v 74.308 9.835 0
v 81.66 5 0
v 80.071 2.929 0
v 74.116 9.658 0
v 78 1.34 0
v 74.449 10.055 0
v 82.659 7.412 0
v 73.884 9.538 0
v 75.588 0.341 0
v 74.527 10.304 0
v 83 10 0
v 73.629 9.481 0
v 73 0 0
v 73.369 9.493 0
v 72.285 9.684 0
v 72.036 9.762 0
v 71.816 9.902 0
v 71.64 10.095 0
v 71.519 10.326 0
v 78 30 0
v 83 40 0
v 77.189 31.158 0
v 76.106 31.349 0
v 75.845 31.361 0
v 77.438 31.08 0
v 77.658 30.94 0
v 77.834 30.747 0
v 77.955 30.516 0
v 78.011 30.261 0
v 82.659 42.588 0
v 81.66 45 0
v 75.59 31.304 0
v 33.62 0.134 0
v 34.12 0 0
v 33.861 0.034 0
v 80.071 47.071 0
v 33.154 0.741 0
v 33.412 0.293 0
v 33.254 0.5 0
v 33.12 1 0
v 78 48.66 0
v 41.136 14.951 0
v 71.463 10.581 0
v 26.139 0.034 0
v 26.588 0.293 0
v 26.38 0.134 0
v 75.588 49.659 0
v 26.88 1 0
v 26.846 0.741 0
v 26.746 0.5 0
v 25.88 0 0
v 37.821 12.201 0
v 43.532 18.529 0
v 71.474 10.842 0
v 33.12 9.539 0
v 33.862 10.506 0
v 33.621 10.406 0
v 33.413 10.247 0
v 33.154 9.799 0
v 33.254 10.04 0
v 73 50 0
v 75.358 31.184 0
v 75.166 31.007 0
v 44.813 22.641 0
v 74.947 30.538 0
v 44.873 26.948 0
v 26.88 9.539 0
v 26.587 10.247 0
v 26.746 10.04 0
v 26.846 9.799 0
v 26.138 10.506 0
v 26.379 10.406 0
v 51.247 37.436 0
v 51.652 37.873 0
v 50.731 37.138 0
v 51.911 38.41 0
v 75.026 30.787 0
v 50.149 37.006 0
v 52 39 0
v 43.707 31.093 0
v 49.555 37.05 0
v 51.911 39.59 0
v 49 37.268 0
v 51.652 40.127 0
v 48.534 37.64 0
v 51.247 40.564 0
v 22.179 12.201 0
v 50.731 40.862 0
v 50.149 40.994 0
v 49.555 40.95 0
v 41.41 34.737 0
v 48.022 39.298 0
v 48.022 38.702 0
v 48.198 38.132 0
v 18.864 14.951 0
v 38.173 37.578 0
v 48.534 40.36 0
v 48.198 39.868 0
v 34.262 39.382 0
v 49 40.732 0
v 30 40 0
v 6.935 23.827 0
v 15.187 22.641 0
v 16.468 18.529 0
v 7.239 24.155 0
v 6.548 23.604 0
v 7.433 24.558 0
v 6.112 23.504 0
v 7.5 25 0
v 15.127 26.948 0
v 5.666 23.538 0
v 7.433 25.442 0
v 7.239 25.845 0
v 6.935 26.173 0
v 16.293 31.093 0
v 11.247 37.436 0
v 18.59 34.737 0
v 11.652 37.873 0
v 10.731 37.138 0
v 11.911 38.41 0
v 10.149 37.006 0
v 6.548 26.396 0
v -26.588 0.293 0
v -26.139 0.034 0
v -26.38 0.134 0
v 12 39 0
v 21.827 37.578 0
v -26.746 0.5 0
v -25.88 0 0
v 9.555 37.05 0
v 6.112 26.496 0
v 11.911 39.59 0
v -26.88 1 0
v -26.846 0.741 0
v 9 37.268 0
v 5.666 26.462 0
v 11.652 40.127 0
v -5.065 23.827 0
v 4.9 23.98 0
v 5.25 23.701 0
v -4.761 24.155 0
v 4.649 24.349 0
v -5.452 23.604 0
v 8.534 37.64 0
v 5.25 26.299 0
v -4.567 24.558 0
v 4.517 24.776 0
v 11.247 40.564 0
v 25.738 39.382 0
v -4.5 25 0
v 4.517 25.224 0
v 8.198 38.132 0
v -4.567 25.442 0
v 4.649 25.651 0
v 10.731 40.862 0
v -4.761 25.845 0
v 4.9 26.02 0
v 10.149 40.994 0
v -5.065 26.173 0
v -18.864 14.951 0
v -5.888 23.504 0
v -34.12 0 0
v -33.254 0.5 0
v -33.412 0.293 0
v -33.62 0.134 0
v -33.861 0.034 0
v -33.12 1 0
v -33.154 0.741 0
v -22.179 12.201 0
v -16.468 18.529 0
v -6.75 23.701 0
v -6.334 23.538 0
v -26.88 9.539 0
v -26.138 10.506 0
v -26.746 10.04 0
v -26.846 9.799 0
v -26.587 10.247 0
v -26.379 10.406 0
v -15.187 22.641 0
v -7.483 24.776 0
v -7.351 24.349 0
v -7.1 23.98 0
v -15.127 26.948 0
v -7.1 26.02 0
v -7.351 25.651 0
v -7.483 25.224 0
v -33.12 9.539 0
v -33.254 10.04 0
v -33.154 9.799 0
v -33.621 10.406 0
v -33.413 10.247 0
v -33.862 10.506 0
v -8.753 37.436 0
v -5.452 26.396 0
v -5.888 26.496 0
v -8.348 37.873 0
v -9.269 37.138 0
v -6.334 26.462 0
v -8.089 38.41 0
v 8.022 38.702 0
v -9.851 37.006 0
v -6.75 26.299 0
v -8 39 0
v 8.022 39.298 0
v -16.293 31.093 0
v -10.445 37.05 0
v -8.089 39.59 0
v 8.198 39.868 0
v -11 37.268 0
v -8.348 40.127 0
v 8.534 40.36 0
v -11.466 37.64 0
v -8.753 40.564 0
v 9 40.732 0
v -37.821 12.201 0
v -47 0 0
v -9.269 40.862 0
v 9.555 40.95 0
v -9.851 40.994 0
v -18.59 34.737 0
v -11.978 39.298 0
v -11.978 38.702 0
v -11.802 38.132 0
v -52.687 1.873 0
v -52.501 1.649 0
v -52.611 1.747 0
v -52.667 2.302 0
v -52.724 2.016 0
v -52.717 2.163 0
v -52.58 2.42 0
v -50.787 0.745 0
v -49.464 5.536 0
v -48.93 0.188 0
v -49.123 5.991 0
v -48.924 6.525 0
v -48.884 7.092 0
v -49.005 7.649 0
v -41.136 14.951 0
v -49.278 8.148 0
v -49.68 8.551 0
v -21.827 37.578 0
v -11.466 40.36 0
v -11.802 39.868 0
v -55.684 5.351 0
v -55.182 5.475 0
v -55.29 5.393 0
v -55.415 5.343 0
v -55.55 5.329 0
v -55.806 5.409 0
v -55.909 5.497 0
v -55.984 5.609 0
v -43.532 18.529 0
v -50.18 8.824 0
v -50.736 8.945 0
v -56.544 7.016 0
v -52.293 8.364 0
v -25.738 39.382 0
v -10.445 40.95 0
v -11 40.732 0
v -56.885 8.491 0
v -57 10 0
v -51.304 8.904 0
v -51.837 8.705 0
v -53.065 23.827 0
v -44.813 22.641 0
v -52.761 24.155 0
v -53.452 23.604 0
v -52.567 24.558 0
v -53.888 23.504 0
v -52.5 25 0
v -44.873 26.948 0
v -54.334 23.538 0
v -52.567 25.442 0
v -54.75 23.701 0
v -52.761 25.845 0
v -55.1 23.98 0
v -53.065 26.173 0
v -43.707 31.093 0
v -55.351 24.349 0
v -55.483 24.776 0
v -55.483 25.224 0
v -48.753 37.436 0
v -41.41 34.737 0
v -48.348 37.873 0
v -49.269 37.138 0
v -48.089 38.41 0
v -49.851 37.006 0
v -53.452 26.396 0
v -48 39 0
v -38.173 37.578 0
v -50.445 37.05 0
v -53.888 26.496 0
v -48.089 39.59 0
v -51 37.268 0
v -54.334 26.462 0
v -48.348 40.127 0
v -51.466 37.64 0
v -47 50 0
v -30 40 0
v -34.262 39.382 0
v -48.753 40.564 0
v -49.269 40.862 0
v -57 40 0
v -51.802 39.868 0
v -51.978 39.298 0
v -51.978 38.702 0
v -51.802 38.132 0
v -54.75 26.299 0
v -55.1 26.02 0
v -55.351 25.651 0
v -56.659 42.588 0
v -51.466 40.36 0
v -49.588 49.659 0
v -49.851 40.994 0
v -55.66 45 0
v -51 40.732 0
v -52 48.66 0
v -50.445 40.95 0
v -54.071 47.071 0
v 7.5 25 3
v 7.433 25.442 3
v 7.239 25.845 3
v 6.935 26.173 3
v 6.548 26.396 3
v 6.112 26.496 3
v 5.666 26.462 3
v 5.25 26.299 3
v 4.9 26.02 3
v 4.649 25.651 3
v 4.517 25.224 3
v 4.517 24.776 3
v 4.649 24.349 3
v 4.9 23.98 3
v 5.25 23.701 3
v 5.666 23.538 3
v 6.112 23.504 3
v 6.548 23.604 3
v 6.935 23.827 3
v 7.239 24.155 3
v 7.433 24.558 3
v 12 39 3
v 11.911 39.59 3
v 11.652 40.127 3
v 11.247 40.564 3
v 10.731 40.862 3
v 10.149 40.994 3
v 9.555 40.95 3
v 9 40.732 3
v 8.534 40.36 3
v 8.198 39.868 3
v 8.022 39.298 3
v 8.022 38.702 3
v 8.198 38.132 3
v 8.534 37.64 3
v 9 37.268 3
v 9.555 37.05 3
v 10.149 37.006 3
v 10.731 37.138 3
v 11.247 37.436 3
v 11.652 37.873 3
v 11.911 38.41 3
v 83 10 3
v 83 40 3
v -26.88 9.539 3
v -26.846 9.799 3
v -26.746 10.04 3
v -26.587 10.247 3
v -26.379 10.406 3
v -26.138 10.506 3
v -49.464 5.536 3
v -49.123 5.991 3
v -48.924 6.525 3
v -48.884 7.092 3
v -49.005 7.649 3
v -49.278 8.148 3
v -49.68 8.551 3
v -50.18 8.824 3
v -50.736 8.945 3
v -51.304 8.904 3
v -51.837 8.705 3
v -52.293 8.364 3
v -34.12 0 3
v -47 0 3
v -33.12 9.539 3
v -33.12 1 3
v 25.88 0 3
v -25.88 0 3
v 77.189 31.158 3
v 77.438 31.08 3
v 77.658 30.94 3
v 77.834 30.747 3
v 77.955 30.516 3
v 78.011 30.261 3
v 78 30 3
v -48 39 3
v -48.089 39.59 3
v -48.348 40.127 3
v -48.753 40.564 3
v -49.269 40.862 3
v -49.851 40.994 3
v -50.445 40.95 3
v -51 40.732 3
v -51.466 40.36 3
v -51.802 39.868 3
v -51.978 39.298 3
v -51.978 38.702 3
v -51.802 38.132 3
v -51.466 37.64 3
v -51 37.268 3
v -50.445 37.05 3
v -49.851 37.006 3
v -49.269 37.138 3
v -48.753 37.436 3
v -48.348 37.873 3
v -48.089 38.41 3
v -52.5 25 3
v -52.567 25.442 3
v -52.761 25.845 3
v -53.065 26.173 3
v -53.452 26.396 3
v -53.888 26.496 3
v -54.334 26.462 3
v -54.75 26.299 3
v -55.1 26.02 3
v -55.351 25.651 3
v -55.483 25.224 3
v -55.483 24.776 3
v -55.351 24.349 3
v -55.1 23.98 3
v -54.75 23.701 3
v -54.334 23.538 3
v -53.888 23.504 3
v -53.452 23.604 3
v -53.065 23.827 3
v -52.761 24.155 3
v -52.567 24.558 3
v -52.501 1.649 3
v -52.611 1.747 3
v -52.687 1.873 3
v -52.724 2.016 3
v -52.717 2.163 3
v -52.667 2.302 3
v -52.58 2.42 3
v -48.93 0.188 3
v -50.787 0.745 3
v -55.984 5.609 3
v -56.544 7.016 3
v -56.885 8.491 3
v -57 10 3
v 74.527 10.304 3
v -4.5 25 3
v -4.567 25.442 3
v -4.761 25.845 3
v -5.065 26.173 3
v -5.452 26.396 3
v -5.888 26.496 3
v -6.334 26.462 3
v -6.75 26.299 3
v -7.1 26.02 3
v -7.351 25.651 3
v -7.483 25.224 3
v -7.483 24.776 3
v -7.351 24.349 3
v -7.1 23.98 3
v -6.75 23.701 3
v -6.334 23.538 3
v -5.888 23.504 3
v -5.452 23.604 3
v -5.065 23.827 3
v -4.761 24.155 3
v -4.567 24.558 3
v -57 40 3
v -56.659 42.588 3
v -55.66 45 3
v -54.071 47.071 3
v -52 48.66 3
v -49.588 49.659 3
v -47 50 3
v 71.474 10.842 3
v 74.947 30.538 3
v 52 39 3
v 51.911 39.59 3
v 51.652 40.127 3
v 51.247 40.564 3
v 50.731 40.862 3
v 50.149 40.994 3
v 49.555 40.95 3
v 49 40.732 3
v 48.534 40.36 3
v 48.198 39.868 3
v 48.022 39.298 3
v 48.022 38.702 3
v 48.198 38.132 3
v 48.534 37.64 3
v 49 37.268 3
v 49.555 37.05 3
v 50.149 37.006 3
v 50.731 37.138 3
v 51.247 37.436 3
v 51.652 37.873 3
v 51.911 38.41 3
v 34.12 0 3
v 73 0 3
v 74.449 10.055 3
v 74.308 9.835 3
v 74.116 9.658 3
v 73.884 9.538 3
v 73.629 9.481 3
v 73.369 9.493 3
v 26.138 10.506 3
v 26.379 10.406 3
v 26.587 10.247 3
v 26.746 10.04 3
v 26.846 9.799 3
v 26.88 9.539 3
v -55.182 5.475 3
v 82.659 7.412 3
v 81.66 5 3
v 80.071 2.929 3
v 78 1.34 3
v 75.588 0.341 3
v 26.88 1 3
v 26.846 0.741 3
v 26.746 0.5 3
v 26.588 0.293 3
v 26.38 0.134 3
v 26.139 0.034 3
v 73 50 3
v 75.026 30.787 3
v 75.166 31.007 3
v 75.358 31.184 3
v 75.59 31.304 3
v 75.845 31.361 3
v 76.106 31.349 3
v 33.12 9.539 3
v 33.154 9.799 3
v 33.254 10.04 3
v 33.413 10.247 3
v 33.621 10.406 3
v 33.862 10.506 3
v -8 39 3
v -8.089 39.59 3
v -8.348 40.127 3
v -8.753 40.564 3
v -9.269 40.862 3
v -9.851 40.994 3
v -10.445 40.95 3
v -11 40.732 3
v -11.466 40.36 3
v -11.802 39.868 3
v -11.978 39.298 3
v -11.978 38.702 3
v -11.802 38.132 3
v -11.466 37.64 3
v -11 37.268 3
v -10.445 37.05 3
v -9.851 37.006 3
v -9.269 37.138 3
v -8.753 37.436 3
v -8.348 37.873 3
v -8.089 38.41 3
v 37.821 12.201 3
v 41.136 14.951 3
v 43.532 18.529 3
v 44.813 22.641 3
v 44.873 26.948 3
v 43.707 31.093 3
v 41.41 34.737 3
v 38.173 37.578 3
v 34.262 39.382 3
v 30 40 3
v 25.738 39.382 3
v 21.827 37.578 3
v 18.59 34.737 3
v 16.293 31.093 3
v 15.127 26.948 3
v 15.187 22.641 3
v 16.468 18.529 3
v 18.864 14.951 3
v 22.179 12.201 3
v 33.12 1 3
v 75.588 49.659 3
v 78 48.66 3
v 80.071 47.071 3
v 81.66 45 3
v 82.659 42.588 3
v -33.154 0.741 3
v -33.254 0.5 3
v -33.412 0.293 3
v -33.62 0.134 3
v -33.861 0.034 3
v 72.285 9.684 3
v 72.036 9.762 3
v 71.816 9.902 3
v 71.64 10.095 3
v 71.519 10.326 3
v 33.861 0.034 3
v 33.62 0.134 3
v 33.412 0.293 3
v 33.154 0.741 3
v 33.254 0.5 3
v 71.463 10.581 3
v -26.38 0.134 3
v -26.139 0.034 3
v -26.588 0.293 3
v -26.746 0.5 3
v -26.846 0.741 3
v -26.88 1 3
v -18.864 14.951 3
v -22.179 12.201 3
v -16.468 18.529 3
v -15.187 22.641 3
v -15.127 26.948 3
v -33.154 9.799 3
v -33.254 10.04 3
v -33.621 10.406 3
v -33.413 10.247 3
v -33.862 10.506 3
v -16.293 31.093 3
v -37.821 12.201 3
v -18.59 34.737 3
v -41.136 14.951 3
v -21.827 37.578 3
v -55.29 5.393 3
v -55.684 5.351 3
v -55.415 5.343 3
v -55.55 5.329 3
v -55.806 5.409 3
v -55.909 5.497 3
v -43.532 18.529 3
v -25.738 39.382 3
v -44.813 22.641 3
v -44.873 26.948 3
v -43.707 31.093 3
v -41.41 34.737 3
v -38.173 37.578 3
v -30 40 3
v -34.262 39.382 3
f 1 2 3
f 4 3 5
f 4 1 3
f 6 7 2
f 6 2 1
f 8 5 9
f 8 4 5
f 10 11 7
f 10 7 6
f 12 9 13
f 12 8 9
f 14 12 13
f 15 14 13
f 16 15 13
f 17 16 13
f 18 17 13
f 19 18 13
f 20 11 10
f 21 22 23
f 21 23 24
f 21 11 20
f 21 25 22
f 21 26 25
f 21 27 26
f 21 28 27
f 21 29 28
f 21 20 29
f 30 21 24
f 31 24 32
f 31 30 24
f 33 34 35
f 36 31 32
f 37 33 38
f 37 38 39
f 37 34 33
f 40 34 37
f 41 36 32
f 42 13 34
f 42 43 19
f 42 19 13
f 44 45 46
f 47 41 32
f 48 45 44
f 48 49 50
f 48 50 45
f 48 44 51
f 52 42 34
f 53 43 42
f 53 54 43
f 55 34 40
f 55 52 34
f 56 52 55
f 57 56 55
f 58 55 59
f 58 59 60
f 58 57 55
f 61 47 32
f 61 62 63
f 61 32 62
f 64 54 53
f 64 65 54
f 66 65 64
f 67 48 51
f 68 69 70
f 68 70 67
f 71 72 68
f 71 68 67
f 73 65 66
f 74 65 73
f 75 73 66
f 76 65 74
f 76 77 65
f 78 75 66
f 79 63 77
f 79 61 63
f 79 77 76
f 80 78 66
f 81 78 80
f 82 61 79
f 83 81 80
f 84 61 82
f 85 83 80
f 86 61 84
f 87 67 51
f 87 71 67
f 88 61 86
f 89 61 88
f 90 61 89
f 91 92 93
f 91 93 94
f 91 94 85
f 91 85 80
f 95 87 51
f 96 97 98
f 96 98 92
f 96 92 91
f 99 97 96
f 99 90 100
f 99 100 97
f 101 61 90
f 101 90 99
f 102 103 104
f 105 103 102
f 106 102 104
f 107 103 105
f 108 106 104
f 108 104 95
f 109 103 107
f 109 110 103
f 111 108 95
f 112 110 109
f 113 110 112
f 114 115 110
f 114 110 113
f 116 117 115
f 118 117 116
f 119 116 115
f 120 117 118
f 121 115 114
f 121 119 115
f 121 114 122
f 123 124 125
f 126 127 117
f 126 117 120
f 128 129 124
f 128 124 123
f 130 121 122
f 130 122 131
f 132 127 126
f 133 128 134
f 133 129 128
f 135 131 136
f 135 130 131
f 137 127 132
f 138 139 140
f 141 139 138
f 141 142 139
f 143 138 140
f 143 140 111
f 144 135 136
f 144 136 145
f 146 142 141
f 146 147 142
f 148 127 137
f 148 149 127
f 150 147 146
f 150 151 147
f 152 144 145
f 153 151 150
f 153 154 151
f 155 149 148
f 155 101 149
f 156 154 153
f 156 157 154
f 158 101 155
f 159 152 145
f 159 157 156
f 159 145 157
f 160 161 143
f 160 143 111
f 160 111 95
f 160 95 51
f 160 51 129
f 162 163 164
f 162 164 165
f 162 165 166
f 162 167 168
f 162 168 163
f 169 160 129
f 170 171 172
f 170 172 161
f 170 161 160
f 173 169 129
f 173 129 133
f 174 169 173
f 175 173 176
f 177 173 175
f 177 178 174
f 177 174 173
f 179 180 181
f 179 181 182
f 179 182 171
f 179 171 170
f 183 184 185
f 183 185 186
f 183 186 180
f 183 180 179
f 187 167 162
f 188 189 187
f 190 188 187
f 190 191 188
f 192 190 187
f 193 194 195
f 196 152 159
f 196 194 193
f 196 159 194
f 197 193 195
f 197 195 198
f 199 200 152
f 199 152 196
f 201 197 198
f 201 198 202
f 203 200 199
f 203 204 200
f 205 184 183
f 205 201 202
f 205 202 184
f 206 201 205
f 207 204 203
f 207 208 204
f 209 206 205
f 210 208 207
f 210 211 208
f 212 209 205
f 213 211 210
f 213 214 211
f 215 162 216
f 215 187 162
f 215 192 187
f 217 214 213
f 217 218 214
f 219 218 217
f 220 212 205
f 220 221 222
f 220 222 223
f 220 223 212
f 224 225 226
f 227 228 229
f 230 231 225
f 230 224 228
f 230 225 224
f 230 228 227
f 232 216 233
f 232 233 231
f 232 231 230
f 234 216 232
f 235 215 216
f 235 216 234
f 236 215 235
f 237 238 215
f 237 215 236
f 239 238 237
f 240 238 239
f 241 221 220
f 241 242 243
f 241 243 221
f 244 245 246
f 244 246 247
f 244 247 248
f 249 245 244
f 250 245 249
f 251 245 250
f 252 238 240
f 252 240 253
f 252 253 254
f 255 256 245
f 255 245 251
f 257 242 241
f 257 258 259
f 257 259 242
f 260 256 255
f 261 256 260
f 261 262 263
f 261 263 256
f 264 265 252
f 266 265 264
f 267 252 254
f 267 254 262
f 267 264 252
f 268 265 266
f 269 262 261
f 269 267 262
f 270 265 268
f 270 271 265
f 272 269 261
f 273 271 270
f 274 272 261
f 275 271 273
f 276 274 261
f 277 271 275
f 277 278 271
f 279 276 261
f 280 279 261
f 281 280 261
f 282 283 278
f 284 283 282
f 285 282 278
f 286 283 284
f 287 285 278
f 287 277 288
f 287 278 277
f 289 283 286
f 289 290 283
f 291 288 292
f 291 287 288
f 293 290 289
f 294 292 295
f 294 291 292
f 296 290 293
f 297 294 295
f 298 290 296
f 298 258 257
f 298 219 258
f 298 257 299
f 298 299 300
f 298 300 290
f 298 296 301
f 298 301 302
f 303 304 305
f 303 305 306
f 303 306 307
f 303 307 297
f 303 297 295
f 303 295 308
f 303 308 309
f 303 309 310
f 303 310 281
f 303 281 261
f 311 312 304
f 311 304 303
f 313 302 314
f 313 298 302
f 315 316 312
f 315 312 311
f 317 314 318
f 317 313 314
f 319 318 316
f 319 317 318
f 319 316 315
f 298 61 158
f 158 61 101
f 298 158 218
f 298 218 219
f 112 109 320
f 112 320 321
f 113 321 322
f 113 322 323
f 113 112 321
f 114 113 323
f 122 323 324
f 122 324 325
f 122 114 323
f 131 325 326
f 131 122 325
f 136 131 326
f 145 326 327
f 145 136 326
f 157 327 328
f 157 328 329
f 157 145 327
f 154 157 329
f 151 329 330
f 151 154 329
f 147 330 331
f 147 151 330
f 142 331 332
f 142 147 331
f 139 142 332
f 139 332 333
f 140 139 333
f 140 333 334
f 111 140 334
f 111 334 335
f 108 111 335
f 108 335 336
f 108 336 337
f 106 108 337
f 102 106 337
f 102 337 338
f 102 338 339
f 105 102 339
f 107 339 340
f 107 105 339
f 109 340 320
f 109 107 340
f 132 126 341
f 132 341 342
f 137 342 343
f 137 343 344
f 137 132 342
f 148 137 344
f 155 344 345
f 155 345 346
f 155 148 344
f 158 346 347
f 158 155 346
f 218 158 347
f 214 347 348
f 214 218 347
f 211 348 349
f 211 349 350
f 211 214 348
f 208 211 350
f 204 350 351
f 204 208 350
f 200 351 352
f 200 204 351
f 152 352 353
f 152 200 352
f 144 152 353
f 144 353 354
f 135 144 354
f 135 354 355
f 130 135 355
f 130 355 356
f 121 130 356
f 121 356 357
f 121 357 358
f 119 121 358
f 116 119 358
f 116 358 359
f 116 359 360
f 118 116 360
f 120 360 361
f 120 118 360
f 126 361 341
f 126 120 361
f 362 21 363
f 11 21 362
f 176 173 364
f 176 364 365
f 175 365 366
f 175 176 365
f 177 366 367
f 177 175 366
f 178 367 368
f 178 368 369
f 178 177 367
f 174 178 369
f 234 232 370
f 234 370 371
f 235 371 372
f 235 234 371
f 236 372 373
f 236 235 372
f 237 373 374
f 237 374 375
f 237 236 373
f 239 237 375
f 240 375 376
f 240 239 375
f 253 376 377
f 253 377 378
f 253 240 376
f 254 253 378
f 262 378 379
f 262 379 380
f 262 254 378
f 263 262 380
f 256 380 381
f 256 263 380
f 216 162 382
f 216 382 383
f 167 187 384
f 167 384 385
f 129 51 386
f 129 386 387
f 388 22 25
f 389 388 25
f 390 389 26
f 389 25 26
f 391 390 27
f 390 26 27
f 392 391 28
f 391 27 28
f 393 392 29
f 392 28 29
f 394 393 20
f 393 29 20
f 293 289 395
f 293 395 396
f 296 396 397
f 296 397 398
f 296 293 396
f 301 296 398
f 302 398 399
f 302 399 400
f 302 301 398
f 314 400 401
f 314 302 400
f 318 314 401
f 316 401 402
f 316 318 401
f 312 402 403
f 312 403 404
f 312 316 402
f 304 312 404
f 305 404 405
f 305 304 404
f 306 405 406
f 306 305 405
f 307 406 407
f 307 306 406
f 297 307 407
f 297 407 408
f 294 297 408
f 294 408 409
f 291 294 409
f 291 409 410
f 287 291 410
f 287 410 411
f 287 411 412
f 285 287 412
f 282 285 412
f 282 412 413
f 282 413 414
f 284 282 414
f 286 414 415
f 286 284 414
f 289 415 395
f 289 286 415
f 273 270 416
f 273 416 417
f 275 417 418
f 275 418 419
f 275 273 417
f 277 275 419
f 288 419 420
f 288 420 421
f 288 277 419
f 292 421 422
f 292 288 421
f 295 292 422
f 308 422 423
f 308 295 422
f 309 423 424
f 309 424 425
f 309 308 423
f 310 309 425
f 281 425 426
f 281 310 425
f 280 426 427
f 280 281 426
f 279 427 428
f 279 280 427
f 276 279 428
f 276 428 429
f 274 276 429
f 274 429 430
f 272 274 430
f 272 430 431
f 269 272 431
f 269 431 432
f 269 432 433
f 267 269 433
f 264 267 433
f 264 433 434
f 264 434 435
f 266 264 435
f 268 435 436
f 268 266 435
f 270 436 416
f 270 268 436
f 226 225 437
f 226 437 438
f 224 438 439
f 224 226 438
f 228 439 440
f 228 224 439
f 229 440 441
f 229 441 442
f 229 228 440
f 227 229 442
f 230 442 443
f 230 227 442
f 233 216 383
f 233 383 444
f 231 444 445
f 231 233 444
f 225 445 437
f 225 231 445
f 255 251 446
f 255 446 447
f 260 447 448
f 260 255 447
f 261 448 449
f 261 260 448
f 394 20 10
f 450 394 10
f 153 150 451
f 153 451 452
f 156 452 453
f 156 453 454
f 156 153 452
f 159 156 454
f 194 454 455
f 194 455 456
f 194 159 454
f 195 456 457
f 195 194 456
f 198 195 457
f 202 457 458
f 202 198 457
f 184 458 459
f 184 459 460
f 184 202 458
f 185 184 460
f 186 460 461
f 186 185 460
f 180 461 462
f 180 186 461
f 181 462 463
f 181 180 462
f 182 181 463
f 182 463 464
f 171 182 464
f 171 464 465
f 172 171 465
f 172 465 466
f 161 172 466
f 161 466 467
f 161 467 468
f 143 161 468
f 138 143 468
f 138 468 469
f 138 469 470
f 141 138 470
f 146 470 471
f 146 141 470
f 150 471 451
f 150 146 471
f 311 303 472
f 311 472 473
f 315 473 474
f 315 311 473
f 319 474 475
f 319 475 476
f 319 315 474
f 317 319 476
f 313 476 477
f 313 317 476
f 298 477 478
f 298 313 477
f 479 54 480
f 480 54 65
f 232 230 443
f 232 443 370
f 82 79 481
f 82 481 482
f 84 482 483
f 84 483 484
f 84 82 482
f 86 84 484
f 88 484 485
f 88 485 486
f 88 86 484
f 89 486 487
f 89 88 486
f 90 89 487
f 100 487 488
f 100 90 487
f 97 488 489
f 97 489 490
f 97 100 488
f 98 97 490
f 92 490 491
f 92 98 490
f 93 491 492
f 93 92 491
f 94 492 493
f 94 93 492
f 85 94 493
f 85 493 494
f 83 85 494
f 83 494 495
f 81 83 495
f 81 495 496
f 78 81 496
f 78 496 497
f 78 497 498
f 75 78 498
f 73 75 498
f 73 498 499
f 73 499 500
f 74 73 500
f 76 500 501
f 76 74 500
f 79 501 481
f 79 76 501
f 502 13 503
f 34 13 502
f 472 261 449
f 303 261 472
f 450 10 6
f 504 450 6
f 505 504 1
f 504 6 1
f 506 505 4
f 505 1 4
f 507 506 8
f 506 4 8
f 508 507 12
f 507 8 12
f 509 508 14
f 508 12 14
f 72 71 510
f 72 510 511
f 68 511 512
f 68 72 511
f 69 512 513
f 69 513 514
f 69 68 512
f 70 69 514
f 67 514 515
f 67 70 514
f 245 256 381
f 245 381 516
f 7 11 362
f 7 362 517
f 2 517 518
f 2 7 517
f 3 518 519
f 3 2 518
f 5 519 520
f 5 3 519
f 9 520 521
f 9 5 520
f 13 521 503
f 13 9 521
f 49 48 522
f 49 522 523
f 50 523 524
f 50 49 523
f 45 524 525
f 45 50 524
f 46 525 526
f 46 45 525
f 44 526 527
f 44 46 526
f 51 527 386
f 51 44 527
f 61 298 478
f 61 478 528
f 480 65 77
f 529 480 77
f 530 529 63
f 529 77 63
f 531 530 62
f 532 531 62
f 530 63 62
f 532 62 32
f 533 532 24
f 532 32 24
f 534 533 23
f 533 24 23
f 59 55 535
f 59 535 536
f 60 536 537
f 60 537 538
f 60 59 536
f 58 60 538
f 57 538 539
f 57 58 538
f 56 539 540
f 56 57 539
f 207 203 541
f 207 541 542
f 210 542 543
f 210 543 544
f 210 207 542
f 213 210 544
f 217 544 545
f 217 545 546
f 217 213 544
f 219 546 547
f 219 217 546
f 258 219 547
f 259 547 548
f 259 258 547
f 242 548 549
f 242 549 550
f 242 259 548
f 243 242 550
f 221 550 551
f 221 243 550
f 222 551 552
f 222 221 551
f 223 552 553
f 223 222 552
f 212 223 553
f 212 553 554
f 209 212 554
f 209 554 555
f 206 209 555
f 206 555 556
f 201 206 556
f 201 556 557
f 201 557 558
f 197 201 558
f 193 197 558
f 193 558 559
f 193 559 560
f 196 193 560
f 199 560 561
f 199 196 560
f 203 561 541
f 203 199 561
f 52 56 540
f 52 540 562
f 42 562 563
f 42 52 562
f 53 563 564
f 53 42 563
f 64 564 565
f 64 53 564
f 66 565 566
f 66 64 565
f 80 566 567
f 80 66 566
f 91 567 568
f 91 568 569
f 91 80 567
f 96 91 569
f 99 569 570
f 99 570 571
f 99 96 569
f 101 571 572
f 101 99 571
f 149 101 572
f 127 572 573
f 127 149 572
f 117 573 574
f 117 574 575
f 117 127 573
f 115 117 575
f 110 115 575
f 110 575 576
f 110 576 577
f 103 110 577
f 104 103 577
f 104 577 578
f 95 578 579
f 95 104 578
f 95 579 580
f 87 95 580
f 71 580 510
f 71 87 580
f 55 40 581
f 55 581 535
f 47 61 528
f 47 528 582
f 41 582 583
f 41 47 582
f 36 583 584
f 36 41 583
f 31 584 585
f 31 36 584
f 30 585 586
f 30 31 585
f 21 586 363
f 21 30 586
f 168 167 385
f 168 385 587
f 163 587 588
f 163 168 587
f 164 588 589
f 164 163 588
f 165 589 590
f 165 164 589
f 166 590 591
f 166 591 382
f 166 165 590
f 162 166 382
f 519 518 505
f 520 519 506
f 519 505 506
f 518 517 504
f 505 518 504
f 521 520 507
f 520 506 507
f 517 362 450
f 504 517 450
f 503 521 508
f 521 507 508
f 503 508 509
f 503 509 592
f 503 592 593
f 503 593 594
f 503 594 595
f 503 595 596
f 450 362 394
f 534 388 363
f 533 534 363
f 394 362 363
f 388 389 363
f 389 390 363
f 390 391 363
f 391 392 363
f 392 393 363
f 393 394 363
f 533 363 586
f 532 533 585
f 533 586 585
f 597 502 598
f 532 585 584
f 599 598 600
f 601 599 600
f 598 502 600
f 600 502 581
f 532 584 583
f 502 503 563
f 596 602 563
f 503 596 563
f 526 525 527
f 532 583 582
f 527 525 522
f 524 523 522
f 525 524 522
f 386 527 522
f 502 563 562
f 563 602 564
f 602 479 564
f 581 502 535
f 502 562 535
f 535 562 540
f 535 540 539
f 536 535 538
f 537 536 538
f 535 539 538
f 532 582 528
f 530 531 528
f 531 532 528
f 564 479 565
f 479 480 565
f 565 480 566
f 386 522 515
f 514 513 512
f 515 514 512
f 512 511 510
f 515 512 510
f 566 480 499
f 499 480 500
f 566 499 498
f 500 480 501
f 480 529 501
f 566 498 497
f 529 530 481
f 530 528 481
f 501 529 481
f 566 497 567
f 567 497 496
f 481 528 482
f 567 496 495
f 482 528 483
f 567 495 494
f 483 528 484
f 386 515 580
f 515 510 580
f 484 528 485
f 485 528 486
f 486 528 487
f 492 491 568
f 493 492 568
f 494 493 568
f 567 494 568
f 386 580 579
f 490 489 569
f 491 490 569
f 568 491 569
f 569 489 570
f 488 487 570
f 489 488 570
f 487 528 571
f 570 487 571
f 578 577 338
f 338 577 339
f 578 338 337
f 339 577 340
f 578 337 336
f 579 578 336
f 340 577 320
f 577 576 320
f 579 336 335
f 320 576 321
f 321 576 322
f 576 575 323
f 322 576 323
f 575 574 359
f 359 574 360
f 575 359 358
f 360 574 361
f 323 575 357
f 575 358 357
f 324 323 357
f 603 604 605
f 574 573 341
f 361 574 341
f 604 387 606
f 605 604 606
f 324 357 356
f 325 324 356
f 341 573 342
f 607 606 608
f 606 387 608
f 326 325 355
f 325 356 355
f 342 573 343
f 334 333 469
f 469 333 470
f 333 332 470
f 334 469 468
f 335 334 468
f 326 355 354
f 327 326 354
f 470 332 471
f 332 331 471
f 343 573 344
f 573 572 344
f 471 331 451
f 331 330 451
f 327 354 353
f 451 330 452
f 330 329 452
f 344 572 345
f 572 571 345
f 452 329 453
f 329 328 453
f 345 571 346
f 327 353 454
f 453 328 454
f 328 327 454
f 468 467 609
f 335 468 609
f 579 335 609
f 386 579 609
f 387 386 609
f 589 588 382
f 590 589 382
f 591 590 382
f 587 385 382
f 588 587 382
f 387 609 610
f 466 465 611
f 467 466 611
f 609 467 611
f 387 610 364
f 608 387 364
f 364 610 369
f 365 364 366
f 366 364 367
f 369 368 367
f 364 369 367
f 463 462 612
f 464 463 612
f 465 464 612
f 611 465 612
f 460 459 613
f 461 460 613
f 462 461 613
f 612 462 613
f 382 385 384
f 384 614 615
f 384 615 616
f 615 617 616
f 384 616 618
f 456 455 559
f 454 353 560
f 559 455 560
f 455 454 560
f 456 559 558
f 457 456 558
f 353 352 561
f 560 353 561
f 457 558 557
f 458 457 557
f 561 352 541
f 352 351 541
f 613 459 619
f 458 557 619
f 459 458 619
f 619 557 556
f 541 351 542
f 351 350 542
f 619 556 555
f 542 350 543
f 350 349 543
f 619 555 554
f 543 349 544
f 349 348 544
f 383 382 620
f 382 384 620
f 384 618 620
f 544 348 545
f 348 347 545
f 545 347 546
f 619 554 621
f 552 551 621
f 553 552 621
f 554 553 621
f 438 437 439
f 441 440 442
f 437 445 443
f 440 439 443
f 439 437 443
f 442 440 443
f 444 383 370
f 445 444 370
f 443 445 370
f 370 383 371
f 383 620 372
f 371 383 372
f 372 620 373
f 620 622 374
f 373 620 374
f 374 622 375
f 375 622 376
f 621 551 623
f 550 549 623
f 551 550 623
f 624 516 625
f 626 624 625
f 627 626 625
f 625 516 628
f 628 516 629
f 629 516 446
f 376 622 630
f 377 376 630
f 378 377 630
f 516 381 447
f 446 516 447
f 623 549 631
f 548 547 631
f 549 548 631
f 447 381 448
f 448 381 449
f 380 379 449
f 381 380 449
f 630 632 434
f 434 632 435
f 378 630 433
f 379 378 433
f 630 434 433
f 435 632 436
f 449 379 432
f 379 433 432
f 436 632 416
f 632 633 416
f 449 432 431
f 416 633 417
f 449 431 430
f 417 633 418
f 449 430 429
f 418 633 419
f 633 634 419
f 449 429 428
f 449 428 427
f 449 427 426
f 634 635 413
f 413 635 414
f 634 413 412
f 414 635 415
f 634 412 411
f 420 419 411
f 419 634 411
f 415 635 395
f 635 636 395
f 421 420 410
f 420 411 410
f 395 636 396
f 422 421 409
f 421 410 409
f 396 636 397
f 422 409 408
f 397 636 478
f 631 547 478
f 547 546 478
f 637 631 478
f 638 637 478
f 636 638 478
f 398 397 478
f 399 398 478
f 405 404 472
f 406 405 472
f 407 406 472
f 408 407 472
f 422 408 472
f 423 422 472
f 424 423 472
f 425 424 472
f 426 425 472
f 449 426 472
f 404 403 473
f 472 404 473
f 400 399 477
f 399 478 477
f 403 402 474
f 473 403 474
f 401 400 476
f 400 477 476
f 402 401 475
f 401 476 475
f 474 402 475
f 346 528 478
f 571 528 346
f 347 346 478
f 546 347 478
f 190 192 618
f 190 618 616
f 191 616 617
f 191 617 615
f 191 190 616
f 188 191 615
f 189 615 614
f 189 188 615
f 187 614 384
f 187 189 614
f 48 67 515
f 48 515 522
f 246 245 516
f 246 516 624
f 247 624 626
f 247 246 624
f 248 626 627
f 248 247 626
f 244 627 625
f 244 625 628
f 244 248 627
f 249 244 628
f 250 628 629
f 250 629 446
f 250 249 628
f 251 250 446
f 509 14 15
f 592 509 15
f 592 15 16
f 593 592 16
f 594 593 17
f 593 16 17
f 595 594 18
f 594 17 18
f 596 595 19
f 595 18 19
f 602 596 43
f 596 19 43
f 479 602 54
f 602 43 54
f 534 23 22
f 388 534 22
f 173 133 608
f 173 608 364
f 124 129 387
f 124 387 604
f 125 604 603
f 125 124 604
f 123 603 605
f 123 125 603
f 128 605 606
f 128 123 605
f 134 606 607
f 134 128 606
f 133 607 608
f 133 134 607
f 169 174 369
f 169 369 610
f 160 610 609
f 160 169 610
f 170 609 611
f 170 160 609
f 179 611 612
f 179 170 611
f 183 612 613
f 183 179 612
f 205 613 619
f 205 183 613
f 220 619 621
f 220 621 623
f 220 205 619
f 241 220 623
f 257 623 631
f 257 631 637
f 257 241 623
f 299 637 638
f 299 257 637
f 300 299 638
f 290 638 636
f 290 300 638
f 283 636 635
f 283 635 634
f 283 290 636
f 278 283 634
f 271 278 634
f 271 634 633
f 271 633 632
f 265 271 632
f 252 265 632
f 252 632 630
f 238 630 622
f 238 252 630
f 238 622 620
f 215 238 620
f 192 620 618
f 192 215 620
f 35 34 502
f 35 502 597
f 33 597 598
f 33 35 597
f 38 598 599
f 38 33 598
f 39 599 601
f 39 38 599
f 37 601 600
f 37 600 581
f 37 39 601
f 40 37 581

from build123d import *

# Parameters (mm, degrees)
ESQUISSE1_R        = 1.5
ESQUISSE1_R_2      = 2
BOSS_EXTRU_1_DEPTH = 3


with BuildPart() as part:
    # Esquisse1 → Boss.-Extru.1 (new body)
    with BuildSketch(Plane.XY):
        with BuildLine():
            Line((-47, 50), (73, 50))
            ThreePointArc((73, 50), (80.071067812, 47.071067812), (83, 40))
            Line((83, 40), (83, 10))
            ThreePointArc((83, 10), (80.071067812, 2.928932188), (73, 0))
            Line((73, 0), (47, 0))
            Line((47, 0), (34.119561541, 0))
            ThreePointArc((34.119561541, 0), (33.41245476, 0.292893219), (33.119561541, 1))
            Line((33.119561541, 1), (33.119561541, 9.539430389))
            ThreePointArc((33.119561541, 9.539430389), (33.326632605, 10.148744513), (33.862088945, 10.505715989))
            ThreePointArc((33.862088945, 10.505715989), (30, 40), (26.137911055, 10.505715989))
            ThreePointArc((26.137911055, 10.505715989), (26.673367395, 10.148744513), (26.880438459, 9.539430389))
            Line((26.880438459, 9.539430389), (26.880438459, 1))
            ThreePointArc((26.880438459, 1), (26.58754524, 0.292893219), (25.880438459, 0))
            Line((25.880438459, 0), (-25.880438459, 0))
            ThreePointArc((-25.880438459, 0), (-26.58754524, 0.292893219), (-26.880438459, 1))
            Line((-26.880438459, 1), (-26.880438459, 9.539430389))
            ThreePointArc((-26.880438459, 9.539430389), (-26.673367395, 10.148744513), (-26.137911055, 10.505715989))
            ThreePointArc((-26.137911055, 10.505715989), (-30, 40), (-33.862088945, 10.505715989))
            ThreePointArc((-33.862088945, 10.505715989), (-33.326632605, 10.148744513), (-33.119561541, 9.539430389))
            Line((-33.119561541, 9.539430389), (-33.119561541, 1))
            ThreePointArc((-33.119561541, 1), (-33.41245476, 0.292893219), (-34.119561541, 0))
            Line((-34.119561541, 0), (-47, 0))
            ThreePointArc((-47, 0), (-49.871560265, 0.42116178), (-52.501242243, 1.649171671))
            ThreePointArc((-52.501242243, 1.649171671), (-52.723609687, 2.016078741), (-52.579733522, 2.420266478))
            Line((-52.579733522, 2.420266478), (-49.464466094, 5.535533906))
            ThreePointArc((-49.464466094, 5.535533906), (-49.464466094, 8.363961031), (-52.292893219, 8.363961031))
            Line((-52.292893219, 8.363961031), (-55.181690934, 5.475163315))
            ThreePointArc((-55.181690934, 5.475163315), (-55.617572947, 5.335541283), (-55.98446771, 5.60917548))
            ThreePointArc((-55.98446771, 5.60917548), (-56.742809582, 7.746633308), (-57, 10))
            Line((-57, 10), (-57, 40))
            ThreePointArc((-57, 40), (-54.071067812, 47.071067812), (-47, 50))
        make_face()
        with Locations((-6, 25)):
            Circle(ESQUISSE1_R, mode=Mode.SUBTRACT)
        with Locations((-54, 25)):
            Circle(ESQUISSE1_R, mode=Mode.SUBTRACT)
        with Locations((6, 25)):
            Circle(ESQUISSE1_R, mode=Mode.SUBTRACT)
        with Locations((50, 39)):
            Circle(ESQUISSE1_R_2, mode=Mode.SUBTRACT)
        with Locations((10, 39)):
            Circle(ESQUISSE1_R_2, mode=Mode.SUBTRACT)
        with Locations((-10, 39)):
            Circle(ESQUISSE1_R_2, mode=Mode.SUBTRACT)
        with Locations((-50, 39)):
            Circle(ESQUISSE1_R_2, mode=Mode.SUBTRACT)
        with BuildLine():
            Line((76.105551896, 31.349468926), (77.188840425, 31.158455931))
            ThreePointArc((77.188840425, 31.158455931), (77.834344291, 30.747224614), (78, 30))
            Line((78, 30), (74.527036447, 10.30384494))
            ThreePointArc((74.527036447, 10.30384494), (74.11580513, 9.658341073), (73.368580516, 9.492685364))
            Line((73.368580516, 9.492685364), (72.285291988, 9.68369836))
            ThreePointArc((72.285291988, 9.68369836), (71.639788121, 10.094929677), (71.474132412, 10.842154291))
            Line((71.474132412, 10.842154291), (74.947095966, 30.538309351))
            ThreePointArc((74.947095966, 30.538309351), (75.358327282, 31.183813217), (76.105551896, 31.349468926))
        make_face(mode=Mode.SUBTRACT)
    extrude(amount=BOSS_EXTRU_1_DEPTH)


solid = part.part
